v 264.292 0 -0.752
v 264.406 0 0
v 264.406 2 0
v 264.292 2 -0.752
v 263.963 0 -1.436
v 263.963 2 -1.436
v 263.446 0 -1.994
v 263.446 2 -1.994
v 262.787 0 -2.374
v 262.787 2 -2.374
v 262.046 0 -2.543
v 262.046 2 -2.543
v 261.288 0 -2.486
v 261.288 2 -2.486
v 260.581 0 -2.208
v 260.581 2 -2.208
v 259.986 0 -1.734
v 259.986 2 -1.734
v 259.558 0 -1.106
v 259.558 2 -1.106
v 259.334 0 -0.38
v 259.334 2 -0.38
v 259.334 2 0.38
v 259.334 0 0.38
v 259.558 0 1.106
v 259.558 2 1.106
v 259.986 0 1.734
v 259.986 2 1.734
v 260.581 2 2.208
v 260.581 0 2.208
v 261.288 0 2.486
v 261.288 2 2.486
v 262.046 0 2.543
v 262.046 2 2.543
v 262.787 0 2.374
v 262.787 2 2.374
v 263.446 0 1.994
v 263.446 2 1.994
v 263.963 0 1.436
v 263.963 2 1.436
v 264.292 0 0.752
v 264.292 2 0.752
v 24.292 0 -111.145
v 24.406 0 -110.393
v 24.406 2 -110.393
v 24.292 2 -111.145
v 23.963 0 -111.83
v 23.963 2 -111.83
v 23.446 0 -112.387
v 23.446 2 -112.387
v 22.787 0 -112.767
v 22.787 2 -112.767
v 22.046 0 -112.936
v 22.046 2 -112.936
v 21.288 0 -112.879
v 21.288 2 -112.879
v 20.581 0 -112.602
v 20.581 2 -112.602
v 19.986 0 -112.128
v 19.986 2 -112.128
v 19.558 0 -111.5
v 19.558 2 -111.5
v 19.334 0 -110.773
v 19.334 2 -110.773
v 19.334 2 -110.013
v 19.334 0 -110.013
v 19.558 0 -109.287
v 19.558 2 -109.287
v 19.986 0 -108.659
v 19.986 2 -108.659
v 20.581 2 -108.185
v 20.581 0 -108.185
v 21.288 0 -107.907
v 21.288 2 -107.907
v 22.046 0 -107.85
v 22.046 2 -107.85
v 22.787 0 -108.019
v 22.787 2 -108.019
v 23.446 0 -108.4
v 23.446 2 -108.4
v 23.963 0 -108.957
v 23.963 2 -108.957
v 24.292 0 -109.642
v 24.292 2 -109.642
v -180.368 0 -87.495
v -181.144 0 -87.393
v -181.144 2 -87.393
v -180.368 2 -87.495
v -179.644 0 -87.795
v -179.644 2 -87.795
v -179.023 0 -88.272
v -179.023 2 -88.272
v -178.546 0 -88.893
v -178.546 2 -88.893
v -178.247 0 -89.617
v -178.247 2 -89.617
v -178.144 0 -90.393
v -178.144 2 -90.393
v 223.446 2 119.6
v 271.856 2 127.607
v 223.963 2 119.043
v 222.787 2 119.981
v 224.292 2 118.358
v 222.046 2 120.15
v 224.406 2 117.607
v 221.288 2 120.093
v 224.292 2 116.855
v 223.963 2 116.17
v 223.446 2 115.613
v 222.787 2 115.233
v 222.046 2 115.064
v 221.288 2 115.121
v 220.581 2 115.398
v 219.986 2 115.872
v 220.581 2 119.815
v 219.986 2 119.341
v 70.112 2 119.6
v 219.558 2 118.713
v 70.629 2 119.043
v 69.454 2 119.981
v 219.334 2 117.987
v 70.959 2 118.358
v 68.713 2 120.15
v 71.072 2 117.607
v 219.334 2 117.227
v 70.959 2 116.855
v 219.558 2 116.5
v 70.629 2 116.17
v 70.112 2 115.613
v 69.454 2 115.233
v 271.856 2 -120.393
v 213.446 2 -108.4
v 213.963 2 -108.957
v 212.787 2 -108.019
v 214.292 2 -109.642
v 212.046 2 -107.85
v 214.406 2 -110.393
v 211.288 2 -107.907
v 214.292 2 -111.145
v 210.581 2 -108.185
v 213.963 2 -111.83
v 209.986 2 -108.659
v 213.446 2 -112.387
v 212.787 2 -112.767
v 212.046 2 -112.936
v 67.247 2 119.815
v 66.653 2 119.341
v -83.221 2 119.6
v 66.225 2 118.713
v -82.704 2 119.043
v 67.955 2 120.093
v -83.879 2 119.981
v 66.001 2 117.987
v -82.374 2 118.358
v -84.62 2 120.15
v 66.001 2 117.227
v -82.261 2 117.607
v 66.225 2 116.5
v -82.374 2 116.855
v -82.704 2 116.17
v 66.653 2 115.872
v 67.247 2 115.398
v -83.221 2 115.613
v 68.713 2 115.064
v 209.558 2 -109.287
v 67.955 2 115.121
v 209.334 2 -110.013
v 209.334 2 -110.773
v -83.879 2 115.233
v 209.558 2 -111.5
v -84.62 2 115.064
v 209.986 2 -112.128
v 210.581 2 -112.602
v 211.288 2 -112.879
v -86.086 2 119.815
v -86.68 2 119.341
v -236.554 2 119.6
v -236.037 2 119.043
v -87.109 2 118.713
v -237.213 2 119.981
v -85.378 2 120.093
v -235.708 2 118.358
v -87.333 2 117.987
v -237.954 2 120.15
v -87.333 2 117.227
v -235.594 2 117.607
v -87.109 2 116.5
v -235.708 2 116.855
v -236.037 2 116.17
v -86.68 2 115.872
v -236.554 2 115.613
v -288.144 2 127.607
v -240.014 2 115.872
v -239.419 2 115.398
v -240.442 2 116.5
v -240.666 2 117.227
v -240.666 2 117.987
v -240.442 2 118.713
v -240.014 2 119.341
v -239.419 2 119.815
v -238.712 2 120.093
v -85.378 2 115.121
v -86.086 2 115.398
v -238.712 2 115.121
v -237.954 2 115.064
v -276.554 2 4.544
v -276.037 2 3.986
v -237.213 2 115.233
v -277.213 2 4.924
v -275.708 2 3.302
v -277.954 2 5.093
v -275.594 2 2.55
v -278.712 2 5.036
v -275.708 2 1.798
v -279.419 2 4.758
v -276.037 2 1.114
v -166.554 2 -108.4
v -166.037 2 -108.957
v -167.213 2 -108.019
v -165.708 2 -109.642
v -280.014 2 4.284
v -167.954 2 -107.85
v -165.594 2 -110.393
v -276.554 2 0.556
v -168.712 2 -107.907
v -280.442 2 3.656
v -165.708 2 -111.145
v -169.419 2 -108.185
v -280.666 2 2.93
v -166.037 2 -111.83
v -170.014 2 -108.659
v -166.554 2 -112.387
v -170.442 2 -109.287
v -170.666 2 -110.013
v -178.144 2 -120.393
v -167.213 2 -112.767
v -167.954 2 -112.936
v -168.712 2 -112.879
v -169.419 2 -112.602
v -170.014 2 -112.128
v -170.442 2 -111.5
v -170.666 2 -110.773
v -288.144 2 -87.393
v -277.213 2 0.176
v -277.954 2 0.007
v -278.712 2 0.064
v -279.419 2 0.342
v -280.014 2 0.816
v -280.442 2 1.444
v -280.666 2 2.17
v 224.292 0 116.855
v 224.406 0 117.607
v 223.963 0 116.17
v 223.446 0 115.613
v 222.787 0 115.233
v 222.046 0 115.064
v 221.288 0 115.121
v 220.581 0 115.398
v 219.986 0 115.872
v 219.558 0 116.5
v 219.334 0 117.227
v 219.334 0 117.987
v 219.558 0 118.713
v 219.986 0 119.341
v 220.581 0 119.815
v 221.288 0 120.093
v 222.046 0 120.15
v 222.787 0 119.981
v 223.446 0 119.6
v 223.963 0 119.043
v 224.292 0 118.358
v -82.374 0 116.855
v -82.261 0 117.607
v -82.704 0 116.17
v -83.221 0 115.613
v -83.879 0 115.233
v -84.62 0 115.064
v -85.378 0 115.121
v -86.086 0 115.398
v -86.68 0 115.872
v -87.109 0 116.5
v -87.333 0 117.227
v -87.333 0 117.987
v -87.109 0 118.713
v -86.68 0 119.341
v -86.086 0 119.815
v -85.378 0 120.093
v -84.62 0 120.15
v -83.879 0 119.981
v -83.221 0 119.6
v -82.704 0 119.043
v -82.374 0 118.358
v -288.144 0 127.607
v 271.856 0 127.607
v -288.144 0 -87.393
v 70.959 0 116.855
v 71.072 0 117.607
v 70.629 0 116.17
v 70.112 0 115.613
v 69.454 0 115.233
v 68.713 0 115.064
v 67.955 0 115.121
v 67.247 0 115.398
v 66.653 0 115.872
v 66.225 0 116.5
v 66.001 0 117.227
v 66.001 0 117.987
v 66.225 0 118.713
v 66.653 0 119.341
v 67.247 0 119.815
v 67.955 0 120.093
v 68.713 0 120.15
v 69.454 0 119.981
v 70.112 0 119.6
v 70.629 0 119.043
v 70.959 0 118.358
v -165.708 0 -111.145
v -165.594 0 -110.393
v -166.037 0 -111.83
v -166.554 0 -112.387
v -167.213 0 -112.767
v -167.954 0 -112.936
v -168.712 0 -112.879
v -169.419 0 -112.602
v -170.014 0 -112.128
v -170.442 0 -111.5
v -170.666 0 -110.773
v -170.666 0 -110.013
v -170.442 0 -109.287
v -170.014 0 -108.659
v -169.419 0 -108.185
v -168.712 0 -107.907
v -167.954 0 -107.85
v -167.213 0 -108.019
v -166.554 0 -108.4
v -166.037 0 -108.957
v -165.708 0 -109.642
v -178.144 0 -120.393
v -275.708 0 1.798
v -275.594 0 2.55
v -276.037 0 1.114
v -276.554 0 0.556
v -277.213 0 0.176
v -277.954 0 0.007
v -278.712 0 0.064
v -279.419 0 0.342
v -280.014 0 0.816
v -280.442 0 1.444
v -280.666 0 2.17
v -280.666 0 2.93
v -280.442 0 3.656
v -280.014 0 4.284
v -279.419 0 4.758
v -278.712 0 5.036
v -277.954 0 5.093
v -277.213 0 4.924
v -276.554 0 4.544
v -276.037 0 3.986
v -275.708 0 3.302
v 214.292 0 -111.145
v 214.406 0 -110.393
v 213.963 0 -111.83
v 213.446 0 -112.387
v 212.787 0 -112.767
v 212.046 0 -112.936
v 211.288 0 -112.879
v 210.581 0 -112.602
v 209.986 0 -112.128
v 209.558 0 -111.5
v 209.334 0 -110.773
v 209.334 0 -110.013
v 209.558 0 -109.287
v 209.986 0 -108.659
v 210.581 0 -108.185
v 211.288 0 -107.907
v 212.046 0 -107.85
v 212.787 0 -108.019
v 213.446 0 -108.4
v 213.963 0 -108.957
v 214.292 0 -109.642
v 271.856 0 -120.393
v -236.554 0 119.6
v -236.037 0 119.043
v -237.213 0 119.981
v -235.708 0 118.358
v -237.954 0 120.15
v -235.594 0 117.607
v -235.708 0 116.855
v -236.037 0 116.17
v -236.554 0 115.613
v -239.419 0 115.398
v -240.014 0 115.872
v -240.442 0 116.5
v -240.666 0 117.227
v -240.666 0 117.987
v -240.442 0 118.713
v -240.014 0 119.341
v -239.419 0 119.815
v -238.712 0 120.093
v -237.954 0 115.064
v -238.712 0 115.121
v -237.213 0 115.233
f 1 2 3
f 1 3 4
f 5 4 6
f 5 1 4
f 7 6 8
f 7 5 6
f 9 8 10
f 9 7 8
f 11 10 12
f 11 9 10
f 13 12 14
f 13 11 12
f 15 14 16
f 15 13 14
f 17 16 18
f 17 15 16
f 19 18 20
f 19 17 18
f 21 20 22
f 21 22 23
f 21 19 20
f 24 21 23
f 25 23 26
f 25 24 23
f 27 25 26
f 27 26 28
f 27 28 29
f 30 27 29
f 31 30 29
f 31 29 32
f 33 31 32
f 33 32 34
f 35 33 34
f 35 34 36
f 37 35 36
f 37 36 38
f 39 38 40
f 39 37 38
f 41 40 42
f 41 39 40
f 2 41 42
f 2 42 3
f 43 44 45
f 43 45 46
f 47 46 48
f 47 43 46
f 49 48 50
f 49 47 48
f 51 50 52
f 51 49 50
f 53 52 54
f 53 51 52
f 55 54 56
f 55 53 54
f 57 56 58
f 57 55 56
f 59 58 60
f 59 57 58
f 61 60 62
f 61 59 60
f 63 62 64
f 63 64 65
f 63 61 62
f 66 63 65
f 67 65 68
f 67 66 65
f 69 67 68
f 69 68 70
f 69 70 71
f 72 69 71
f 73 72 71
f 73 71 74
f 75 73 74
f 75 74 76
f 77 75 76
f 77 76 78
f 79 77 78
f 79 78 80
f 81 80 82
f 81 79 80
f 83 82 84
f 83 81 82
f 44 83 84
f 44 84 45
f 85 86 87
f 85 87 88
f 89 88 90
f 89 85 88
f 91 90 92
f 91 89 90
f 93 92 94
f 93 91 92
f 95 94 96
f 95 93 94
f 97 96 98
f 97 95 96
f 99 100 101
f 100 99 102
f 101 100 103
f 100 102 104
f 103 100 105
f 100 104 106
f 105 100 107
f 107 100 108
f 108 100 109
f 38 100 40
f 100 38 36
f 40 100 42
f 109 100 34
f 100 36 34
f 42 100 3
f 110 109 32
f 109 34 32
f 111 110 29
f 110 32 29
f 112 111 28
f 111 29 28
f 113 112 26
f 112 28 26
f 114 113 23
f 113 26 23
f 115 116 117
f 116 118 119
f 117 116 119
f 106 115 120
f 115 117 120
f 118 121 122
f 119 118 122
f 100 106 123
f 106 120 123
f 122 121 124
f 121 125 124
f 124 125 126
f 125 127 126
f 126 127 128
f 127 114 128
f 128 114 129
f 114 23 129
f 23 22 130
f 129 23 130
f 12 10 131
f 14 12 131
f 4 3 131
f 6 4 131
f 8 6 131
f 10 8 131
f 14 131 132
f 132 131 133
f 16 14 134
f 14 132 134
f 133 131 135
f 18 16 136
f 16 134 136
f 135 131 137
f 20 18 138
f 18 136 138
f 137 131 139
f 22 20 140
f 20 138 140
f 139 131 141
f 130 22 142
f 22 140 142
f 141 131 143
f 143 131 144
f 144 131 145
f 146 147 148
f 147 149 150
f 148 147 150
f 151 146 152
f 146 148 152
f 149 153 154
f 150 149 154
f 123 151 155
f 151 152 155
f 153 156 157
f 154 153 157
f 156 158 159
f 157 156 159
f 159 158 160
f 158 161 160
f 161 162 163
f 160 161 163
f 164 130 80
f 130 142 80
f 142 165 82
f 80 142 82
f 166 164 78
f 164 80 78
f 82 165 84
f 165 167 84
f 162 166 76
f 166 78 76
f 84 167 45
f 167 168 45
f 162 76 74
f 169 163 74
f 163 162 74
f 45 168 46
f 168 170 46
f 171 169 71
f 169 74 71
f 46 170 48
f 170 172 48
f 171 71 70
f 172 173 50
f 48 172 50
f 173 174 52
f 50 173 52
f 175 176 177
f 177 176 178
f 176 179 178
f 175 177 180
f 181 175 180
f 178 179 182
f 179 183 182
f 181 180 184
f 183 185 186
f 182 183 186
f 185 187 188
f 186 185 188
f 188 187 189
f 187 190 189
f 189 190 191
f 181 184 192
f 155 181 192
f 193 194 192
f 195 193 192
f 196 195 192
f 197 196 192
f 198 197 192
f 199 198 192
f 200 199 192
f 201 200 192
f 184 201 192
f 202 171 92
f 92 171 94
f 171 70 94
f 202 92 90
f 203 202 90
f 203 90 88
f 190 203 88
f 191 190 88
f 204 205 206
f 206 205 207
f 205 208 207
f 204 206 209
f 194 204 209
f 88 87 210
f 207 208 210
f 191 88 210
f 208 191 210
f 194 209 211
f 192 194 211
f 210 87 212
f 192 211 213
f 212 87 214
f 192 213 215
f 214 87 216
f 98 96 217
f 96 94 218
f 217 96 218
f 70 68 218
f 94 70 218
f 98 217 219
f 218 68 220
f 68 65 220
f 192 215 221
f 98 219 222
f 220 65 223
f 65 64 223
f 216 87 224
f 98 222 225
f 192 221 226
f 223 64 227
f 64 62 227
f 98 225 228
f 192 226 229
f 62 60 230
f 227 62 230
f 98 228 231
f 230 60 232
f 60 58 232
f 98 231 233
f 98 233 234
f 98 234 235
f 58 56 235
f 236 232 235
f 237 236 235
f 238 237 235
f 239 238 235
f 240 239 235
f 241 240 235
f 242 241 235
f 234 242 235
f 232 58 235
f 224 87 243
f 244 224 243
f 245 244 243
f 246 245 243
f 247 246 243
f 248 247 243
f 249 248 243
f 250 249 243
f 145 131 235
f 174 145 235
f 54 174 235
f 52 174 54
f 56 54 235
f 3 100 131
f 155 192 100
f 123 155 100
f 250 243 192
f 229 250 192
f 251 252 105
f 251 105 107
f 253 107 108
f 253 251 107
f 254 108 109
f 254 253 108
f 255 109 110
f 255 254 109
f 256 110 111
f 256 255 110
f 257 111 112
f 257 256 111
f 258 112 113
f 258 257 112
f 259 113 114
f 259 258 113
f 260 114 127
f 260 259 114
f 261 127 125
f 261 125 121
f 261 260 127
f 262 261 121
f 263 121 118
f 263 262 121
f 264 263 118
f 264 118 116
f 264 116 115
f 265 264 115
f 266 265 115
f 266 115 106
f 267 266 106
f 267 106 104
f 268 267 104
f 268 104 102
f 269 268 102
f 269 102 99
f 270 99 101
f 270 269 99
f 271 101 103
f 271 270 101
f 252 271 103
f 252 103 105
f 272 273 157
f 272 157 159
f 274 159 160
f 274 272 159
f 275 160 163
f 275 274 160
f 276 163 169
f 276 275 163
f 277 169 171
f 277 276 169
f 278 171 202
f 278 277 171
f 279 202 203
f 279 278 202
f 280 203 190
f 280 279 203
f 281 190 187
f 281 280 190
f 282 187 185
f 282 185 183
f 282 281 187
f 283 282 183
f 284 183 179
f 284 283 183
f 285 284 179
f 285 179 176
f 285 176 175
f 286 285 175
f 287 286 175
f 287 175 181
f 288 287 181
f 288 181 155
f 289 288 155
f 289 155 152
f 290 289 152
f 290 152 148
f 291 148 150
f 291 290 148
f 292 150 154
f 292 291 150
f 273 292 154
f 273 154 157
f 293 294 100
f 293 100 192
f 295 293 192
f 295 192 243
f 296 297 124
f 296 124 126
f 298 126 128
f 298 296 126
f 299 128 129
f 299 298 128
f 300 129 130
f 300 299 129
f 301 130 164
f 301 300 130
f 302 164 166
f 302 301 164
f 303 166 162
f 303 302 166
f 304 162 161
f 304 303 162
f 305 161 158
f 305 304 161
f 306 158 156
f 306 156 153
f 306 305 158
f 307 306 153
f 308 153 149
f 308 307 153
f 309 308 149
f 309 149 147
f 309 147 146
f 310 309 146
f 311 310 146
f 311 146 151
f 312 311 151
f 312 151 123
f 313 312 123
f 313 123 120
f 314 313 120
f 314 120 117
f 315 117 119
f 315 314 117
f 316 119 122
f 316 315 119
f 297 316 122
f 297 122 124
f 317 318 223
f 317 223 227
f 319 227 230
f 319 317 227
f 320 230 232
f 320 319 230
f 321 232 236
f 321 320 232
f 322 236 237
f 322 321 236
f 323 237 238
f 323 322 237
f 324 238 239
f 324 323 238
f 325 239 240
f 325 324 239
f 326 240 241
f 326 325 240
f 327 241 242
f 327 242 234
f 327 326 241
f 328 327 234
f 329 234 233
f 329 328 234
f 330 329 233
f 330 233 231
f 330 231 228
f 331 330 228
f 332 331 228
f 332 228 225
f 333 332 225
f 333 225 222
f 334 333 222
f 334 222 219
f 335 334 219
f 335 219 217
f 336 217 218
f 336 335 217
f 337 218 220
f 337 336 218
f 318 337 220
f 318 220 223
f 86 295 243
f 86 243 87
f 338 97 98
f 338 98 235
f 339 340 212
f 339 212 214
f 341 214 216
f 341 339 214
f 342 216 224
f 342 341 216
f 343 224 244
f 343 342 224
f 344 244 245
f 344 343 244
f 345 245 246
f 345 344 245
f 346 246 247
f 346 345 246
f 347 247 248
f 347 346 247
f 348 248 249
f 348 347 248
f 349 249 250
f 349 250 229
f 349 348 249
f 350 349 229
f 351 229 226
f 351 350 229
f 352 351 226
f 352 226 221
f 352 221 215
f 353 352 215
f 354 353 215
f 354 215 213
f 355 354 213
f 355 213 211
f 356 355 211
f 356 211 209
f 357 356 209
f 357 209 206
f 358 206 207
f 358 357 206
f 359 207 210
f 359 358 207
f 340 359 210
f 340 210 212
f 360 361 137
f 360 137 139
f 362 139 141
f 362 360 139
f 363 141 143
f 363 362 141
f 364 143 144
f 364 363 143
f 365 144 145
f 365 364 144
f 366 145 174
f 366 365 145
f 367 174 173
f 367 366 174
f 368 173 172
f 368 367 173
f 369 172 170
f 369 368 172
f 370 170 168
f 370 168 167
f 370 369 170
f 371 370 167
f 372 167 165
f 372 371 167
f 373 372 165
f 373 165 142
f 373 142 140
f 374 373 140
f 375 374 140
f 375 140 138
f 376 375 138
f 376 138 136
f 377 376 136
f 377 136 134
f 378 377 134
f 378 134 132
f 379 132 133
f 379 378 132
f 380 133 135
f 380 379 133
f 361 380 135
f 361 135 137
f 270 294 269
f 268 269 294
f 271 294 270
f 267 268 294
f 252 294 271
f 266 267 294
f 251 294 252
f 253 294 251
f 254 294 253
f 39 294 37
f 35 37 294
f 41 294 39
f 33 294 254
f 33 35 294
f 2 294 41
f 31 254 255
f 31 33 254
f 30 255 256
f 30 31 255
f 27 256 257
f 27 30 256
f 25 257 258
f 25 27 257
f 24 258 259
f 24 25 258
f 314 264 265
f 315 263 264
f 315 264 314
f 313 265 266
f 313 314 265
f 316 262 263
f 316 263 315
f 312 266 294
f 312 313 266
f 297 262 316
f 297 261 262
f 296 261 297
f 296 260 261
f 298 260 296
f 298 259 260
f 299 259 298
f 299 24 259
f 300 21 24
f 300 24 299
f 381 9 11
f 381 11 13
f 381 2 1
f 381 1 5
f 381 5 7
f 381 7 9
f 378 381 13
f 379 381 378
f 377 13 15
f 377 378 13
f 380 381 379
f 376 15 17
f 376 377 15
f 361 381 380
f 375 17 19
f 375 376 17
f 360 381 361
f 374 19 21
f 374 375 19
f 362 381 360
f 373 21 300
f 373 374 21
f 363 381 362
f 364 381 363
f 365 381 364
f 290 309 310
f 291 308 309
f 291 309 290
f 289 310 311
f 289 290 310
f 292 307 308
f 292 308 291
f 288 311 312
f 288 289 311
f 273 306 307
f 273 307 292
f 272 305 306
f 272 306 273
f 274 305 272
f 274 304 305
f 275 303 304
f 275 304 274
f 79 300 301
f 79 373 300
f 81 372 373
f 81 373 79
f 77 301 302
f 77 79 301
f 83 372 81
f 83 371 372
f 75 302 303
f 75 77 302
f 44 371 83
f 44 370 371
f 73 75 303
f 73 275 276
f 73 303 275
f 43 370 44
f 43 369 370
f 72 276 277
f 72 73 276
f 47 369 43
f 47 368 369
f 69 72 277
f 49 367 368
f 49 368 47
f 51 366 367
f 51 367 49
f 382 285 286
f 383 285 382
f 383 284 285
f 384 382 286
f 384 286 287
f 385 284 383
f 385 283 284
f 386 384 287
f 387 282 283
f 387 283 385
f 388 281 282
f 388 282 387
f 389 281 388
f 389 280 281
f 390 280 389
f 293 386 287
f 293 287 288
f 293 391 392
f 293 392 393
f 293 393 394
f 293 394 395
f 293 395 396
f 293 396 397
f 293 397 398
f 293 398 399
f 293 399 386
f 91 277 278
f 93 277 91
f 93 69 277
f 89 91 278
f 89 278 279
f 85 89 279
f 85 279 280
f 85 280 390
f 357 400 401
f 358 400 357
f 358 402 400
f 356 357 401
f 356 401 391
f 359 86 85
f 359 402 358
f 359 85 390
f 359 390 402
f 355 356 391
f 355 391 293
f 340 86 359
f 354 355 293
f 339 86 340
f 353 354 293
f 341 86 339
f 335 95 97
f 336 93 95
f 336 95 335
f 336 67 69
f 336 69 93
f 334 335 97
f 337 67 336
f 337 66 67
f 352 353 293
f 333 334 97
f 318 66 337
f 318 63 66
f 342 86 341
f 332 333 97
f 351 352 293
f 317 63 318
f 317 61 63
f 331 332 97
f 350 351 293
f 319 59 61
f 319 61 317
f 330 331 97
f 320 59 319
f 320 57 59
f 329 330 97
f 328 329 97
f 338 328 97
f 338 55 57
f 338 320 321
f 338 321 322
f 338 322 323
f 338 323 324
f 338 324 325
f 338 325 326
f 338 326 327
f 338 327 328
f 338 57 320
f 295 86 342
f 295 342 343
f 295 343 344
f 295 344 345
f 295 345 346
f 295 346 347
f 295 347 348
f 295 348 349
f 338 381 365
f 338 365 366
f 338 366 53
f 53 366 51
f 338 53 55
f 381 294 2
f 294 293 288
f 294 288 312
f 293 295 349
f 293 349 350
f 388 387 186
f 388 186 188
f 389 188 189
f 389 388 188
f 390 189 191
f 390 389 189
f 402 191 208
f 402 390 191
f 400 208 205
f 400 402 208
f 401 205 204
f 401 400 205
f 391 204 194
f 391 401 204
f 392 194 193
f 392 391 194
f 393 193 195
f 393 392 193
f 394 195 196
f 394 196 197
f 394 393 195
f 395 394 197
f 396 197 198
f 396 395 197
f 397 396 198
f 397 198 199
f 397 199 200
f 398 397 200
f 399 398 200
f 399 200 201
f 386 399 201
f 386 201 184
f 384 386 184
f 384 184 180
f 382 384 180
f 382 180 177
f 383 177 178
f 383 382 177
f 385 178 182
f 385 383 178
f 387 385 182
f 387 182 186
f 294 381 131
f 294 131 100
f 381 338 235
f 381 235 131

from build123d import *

# Parameters (mm, degrees)
SKETCH1_R           = 2.55
BOSS_EXTRUDE1_DEPTH = 2


with BuildPart() as part:
    # Sketch1 → Boss-Extrude1 (new body)
    with BuildSketch(Plane(origin=(0, 0, 0), x_dir=(1, 0, 0), z_dir=(0, 1, 0))):
        with BuildLine():
            Line((-288.144382289, 87.393439394), (-181.144388941, 87.393202129))
            ThreePointArc((-181.144388941, 87.393202129), (-179.023064297, 88.271879434), (-178.144382289, 90.393202129))
            Line((-178.144382289, 90.393202129), (-178.144382289, 120.393202129))
            Line((-178.144382289, 120.393202129), (271.855617711, 120.393202129))
            Line((271.855617711, 120.393202129), (271.855617711, -127.606797871))
            Line((271.855617711, -127.606797871), (-288.144382289, -127.606797871))
            Line((-288.144382289, -127.606797871), (-288.144382289, 87.393439394))
        make_face()
        with Locations((211.855617711, 110.393202129)):
            Circle(SKETCH1_R, mode=Mode.SUBTRACT)
        with Locations((-168.144382289, 110.393202129)):
            Circle(SKETCH1_R, mode=Mode.SUBTRACT)
        with Locations((21.855617711, 110.393202129)):
            Circle(SKETCH1_R, mode=Mode.SUBTRACT)
        with Locations((-238.144382289, -117.606797871)):
            Circle(SKETCH1_R, mode=Mode.SUBTRACT)
        with Locations((-84.811048956, -117.606797871)):
            Circle(SKETCH1_R, mode=Mode.SUBTRACT)
        with Locations((68.522284378, -117.606797871)):
            Circle(SKETCH1_R, mode=Mode.SUBTRACT)
        with Locations((221.855617711, -117.606797871)):
            Circle(SKETCH1_R, mode=Mode.SUBTRACT)
        with Locations((261.855617711, 0)):
            Circle(SKETCH1_R, mode=Mode.SUBTRACT)
        with Locations((-278.144382289, -2.55)):
            Circle(SKETCH1_R, mode=Mode.SUBTRACT)
    extrude(amount=BOSS_EXTRUDE1_DEPTH)


solid = part.part
